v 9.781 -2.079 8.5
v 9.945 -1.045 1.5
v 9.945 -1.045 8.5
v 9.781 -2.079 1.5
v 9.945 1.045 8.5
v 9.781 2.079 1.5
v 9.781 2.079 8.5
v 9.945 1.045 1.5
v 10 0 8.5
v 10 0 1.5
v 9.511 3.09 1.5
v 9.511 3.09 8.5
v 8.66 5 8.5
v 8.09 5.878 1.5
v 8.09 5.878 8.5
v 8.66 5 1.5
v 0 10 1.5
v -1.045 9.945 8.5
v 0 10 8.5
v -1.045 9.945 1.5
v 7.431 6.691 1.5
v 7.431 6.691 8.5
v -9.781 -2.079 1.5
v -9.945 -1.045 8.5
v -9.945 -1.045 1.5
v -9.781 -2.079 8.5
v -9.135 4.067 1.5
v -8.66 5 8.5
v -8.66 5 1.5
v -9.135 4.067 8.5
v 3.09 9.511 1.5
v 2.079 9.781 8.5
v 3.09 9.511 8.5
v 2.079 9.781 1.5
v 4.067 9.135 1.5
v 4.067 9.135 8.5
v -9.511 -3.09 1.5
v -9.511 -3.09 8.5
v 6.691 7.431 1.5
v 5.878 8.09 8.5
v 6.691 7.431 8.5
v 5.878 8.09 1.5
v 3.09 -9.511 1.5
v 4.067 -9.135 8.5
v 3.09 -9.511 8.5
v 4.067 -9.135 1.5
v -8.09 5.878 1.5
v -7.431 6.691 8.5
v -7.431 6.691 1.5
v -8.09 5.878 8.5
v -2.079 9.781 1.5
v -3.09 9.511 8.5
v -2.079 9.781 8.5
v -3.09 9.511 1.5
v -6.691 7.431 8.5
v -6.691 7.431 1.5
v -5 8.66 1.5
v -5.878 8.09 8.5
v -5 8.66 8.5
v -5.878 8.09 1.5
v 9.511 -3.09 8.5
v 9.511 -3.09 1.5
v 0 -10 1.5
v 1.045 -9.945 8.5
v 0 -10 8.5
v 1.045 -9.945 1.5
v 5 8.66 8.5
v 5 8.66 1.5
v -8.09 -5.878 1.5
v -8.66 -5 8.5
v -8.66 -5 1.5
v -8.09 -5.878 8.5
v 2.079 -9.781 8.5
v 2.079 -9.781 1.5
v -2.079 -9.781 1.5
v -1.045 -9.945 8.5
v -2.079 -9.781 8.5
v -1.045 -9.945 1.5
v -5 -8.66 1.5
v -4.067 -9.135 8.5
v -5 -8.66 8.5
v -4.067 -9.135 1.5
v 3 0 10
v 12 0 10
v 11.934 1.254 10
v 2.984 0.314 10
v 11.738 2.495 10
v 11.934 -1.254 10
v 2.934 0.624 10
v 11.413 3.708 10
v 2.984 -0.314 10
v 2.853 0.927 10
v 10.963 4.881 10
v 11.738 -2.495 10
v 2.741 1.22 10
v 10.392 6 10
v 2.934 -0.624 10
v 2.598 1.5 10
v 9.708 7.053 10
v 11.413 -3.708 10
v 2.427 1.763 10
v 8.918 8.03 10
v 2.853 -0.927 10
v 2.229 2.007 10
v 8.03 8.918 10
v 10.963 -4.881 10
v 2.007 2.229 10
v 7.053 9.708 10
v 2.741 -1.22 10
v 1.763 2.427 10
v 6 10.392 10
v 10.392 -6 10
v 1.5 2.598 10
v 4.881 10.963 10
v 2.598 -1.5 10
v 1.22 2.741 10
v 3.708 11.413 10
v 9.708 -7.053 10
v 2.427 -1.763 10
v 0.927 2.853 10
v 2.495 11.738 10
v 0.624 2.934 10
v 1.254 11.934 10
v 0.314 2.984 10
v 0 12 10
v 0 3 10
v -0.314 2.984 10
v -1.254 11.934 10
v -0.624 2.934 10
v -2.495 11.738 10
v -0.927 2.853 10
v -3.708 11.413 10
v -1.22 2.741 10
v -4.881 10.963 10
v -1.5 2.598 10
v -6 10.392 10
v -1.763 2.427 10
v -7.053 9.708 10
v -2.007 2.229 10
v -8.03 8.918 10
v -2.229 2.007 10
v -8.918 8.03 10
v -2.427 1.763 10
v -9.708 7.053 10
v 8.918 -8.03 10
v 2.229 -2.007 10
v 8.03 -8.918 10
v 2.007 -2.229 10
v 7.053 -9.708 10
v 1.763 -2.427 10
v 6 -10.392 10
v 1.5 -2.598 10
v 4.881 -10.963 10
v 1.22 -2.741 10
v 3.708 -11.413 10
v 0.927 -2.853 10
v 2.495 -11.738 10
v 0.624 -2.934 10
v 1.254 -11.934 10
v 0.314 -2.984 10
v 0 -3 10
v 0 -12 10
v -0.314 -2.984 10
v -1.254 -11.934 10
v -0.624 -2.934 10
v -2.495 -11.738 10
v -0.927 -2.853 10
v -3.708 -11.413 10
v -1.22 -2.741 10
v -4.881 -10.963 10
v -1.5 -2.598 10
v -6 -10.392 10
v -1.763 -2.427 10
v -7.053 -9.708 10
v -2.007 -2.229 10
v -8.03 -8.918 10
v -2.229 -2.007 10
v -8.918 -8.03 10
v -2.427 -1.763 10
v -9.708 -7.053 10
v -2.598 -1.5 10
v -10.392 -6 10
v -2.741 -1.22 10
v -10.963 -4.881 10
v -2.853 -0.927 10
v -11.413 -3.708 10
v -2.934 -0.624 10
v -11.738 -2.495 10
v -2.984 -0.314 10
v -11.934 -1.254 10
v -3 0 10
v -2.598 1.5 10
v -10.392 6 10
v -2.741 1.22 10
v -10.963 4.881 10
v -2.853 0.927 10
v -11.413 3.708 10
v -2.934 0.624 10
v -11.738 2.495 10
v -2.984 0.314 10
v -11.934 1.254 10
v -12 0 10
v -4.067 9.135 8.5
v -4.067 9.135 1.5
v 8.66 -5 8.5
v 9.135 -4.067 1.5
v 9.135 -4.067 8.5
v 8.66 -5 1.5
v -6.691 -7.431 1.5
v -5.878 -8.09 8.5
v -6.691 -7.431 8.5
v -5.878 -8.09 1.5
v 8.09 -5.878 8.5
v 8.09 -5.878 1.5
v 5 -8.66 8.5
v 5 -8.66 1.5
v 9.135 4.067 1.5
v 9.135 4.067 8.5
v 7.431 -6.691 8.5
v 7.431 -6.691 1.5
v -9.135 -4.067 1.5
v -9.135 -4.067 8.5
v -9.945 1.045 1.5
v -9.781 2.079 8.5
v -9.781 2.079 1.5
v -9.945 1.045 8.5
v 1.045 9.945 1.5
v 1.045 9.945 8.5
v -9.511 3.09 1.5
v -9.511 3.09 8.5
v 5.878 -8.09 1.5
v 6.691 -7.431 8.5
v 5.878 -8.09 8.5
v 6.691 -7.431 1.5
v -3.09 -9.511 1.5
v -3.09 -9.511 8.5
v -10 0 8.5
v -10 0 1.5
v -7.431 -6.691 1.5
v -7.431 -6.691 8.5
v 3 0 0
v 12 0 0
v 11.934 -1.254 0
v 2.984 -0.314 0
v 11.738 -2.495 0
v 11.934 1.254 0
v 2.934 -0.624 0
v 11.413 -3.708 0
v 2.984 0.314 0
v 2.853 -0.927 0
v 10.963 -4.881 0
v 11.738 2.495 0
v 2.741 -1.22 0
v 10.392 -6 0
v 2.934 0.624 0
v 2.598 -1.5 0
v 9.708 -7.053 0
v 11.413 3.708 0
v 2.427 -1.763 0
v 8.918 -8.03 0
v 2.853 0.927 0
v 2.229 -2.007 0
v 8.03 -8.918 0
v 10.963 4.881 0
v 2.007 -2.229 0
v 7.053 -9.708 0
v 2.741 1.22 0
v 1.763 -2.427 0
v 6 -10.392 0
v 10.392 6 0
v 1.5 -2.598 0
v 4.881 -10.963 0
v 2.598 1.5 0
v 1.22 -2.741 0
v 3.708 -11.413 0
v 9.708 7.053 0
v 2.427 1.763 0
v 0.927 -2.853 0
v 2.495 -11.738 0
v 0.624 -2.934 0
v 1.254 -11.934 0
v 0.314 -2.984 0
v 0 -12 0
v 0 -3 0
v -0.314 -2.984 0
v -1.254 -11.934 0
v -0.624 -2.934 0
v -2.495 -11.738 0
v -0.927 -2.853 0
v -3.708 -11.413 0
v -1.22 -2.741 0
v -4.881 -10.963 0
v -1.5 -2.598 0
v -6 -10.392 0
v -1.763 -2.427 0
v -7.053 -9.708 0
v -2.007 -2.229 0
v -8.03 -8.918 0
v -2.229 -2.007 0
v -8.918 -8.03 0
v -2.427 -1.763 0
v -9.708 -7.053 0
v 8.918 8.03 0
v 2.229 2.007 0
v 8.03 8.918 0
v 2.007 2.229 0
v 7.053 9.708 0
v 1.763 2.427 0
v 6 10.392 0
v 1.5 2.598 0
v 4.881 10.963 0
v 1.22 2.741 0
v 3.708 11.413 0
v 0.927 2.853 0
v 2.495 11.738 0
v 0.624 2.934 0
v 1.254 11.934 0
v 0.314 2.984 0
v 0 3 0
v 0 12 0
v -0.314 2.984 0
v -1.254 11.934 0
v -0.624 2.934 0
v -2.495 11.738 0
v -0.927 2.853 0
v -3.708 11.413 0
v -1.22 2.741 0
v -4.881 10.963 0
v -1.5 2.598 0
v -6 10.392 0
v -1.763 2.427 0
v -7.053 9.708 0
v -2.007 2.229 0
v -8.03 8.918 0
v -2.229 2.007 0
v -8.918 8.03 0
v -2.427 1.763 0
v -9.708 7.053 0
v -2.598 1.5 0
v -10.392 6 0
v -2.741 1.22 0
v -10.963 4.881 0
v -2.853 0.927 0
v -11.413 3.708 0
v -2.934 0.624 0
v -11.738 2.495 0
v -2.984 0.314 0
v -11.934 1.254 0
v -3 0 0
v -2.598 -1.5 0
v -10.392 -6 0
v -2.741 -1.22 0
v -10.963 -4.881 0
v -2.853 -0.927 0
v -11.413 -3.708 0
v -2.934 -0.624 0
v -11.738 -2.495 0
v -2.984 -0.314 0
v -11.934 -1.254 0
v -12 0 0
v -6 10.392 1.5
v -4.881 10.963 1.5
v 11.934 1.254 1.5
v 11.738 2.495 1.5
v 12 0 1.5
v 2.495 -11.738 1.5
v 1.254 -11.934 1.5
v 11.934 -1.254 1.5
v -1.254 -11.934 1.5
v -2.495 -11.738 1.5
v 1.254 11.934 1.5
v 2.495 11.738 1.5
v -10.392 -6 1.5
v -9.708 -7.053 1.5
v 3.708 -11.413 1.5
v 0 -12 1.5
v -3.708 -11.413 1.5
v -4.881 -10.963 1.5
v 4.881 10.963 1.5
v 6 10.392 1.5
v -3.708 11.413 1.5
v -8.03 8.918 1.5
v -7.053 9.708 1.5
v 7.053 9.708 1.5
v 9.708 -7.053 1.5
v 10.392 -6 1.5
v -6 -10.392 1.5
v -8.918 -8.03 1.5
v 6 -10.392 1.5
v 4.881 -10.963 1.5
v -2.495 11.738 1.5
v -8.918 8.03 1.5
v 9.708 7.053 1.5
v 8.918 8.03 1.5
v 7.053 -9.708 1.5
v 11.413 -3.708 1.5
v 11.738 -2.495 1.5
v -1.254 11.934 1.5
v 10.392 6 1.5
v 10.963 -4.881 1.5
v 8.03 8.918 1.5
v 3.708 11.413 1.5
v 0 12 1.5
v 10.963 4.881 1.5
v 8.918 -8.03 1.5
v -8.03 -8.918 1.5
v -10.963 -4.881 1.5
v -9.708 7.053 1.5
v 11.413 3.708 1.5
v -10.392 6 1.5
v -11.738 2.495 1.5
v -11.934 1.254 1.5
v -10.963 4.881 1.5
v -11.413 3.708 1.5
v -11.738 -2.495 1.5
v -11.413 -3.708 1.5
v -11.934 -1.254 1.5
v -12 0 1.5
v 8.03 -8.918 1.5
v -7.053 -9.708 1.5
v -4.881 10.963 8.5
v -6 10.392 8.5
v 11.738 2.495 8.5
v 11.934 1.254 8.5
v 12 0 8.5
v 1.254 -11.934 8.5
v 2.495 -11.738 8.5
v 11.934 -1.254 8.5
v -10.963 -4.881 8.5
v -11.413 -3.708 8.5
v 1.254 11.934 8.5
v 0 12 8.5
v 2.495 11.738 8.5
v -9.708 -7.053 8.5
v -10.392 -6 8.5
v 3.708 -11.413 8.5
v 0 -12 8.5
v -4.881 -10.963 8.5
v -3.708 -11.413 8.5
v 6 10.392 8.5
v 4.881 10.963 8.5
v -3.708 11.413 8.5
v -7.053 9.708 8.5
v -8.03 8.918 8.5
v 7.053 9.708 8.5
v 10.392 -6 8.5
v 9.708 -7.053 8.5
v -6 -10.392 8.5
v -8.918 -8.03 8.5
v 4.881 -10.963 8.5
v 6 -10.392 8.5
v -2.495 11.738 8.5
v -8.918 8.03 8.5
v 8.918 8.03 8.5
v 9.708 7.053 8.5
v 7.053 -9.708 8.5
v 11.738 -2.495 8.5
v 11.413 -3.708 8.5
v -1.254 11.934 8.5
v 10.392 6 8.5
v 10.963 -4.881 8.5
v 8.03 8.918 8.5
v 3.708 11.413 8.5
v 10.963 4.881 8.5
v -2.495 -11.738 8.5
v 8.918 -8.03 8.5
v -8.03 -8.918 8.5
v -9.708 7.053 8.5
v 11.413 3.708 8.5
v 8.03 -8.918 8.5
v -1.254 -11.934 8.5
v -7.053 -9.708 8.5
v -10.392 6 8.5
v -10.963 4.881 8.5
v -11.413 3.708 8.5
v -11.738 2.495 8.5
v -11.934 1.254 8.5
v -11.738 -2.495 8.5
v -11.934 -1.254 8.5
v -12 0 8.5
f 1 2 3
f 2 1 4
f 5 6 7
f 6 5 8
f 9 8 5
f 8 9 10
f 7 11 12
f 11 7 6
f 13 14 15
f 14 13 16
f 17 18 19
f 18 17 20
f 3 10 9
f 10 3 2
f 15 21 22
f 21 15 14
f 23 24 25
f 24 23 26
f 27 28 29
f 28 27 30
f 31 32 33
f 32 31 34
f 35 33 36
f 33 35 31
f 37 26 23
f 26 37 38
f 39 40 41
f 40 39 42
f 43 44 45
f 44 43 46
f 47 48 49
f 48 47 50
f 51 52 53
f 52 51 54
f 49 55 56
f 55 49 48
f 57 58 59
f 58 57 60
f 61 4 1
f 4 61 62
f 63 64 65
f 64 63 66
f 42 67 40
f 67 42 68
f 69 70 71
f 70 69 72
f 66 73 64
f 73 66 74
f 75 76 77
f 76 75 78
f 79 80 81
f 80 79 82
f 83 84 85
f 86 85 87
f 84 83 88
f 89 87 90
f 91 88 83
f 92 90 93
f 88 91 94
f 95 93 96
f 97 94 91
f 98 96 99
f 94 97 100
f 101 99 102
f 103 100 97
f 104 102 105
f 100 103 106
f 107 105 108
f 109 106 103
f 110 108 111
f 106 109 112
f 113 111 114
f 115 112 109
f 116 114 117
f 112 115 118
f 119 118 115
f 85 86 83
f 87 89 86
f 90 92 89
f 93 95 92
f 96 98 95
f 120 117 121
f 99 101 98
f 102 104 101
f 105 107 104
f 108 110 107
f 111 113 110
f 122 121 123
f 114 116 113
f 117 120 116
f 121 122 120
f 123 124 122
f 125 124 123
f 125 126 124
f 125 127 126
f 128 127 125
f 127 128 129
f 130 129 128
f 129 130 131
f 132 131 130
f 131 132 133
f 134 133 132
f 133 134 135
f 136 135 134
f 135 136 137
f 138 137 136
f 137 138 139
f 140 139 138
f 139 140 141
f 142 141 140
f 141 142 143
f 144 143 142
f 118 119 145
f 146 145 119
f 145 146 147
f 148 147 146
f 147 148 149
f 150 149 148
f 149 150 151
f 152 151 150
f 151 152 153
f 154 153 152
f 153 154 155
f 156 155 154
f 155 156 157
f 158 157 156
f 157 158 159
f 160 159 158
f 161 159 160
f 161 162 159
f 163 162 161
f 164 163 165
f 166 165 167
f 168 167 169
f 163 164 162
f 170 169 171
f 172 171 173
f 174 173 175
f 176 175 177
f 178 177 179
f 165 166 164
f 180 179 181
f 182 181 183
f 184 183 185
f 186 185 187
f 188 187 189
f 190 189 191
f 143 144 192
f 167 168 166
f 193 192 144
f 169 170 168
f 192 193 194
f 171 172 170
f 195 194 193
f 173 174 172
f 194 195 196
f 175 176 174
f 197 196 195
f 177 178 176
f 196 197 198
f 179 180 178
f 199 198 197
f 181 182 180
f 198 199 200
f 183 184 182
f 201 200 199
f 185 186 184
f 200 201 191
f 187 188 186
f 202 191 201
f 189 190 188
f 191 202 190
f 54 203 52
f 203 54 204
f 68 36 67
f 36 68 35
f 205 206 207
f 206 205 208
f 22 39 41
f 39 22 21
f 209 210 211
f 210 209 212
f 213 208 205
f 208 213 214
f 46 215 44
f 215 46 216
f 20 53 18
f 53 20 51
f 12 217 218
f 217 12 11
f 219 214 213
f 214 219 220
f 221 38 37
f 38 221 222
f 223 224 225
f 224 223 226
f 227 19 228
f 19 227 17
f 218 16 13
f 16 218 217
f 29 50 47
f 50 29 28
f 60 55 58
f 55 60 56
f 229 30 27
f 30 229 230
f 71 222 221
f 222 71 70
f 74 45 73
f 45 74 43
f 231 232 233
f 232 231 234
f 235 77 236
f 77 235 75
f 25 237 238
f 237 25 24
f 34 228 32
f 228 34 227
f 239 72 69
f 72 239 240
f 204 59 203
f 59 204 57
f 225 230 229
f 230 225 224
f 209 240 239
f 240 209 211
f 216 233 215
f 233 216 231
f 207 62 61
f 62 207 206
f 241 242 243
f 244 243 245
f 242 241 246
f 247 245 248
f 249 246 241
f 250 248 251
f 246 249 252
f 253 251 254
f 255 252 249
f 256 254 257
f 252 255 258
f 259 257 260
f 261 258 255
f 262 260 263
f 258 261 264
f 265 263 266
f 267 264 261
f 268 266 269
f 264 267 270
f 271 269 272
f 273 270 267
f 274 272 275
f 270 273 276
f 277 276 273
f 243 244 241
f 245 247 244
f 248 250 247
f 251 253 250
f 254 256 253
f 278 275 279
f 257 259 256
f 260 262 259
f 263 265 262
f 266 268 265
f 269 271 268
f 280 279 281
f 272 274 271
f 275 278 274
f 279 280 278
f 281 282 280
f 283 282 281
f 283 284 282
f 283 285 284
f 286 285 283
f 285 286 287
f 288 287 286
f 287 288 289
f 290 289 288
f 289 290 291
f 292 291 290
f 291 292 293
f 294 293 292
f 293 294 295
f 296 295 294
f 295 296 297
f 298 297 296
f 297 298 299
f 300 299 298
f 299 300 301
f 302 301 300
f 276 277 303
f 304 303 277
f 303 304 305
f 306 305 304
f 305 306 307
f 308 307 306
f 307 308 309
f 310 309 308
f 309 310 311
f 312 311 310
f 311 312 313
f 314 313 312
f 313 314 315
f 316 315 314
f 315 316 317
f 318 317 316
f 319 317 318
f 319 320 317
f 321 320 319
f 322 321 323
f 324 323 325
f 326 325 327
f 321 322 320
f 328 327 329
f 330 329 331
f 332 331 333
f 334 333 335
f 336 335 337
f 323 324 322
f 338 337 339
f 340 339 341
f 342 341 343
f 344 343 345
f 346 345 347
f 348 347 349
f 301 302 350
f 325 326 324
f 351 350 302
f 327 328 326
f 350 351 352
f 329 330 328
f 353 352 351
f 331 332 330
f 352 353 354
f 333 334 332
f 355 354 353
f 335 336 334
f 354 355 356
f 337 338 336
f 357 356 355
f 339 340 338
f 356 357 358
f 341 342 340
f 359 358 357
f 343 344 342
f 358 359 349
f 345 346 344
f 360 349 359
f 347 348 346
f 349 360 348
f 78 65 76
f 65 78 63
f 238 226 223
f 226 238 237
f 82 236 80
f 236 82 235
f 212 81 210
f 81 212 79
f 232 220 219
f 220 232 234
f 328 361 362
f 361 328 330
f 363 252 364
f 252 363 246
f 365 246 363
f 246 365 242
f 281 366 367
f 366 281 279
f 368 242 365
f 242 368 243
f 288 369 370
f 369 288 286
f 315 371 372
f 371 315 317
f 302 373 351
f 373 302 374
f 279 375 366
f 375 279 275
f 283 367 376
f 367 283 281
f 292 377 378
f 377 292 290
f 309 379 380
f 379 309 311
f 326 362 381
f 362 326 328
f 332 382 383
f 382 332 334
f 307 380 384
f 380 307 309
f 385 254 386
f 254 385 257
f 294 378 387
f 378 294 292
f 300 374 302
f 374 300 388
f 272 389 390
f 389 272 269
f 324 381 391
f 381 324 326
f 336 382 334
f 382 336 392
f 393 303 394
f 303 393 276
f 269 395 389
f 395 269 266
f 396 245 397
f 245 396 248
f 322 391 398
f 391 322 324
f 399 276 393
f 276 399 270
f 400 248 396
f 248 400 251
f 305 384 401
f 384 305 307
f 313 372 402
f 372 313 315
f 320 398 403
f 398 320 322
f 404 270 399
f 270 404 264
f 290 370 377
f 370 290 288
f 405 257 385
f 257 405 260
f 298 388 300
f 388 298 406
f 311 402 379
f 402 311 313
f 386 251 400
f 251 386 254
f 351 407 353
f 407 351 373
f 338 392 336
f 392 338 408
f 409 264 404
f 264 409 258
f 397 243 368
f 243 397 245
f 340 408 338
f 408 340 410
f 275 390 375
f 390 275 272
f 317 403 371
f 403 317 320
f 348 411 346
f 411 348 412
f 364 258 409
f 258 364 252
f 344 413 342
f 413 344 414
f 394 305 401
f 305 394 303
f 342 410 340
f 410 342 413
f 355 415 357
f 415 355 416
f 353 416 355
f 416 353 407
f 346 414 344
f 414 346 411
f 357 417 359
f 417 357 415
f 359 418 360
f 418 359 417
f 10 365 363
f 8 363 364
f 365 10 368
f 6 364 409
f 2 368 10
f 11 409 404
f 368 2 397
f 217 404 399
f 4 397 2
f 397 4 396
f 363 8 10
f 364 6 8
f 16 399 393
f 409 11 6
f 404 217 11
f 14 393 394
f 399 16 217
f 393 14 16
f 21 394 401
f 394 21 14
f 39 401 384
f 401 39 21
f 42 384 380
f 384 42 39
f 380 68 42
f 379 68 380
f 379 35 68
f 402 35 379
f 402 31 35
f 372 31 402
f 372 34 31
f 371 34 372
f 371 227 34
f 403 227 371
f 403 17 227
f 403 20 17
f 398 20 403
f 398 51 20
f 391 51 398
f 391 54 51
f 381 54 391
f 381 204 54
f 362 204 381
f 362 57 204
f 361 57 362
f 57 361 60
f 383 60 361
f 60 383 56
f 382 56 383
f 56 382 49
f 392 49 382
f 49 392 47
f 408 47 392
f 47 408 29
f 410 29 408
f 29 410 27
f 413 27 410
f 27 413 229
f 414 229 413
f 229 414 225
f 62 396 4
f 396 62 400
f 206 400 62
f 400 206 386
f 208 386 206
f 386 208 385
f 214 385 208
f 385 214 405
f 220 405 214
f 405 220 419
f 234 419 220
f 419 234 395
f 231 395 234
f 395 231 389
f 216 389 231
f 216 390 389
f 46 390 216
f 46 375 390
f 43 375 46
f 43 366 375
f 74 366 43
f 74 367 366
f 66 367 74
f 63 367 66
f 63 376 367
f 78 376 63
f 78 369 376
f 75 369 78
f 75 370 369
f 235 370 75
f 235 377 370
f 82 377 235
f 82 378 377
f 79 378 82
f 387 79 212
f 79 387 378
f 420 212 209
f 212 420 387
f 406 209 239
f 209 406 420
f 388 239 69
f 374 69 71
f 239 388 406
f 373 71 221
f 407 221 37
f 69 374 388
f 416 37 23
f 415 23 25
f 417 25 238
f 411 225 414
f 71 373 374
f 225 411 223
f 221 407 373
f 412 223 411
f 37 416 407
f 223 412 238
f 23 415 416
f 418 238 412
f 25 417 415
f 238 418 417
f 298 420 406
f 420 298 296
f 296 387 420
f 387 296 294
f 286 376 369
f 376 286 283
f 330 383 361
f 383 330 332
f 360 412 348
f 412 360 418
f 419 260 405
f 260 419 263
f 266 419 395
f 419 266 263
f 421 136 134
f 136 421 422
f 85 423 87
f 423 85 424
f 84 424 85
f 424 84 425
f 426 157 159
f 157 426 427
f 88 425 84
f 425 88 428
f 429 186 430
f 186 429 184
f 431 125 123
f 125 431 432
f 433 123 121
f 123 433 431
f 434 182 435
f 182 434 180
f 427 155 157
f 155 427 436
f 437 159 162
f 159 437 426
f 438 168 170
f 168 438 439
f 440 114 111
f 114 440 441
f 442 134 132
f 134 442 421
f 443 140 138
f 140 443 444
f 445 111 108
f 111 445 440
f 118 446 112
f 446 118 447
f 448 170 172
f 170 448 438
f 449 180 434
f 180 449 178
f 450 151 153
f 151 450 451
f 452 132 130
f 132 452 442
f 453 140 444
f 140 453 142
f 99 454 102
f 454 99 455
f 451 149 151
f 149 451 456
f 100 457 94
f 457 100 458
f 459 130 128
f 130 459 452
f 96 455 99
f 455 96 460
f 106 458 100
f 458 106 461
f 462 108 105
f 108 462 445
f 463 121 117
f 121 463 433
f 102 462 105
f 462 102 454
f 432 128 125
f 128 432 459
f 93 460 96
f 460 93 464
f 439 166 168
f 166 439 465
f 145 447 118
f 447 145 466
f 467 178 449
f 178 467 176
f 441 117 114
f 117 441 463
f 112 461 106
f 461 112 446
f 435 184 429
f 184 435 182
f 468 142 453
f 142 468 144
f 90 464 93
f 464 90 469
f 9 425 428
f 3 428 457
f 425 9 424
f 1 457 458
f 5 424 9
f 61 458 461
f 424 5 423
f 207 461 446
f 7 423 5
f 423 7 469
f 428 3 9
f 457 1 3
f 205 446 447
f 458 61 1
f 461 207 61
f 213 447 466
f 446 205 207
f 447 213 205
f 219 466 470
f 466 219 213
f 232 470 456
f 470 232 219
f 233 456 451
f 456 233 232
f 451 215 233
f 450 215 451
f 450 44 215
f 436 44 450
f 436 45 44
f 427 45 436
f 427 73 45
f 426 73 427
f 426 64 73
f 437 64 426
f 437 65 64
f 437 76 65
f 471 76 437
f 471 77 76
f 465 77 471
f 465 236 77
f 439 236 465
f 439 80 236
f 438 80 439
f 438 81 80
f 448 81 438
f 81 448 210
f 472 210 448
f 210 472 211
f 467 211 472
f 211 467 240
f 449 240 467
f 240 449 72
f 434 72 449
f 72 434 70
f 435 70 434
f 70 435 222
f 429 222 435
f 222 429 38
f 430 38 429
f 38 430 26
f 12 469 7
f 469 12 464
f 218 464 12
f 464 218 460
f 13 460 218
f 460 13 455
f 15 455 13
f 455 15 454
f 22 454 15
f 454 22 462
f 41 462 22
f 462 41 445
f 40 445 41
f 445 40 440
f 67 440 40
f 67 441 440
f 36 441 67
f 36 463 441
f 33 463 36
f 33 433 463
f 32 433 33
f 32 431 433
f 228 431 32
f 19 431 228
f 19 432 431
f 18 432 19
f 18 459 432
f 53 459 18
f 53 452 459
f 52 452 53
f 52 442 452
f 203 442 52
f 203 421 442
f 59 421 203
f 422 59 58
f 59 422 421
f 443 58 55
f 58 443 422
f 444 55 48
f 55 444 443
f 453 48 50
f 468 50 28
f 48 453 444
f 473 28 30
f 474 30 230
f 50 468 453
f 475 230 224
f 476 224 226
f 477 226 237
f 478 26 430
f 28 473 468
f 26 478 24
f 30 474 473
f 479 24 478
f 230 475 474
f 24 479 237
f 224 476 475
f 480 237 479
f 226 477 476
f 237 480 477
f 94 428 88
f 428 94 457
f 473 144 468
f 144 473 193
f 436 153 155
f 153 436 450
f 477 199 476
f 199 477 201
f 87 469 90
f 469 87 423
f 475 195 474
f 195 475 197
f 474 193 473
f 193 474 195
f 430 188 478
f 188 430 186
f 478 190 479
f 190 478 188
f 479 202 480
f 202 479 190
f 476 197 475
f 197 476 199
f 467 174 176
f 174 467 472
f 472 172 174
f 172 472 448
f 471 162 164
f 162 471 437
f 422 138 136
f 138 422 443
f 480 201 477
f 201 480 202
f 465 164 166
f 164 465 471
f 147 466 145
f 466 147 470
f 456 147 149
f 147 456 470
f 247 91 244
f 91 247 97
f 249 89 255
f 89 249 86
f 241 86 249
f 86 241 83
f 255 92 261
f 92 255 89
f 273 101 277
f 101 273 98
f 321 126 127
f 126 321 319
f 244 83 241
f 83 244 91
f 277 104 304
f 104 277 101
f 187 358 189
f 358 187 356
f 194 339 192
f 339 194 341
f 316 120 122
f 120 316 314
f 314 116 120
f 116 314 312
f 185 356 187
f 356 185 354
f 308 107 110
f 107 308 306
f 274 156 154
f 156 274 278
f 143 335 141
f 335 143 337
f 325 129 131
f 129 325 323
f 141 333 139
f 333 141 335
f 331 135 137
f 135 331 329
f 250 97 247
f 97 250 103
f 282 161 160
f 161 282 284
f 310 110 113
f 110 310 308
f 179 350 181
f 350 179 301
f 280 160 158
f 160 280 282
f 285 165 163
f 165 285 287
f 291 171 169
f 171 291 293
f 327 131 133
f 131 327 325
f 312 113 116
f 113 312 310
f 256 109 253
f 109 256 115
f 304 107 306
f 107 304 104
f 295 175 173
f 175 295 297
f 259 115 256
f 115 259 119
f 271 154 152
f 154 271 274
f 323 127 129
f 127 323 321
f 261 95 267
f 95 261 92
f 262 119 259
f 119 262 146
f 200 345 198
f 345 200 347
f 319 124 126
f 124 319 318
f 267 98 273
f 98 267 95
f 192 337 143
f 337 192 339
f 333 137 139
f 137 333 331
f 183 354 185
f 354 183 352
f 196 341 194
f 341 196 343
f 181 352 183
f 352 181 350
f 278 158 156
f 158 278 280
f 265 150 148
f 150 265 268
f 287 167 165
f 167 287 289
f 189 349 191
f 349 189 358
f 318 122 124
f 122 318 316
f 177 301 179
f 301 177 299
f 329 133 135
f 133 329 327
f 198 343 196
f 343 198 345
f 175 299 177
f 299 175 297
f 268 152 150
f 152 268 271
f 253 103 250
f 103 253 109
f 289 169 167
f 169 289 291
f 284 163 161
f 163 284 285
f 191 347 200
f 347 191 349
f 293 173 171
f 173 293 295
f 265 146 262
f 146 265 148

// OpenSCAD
// Plain idler pulley with retaining flanges.
$fn = 60;
eps = 0.02;
bore_d = 6;
body_d = 20;
width = 10;
flange_t = 1.5;
difference() {
    union() {
        cylinder(d=body_d,h=width);
        cylinder(d=body_d+4,h=flange_t);
        translate([0,0,width-flange_t]) cylinder(d=body_d+4,h=flange_t);
    }
    translate([0,0,-eps]) cylinder(d=bore_d,h=width+2*eps);
}
